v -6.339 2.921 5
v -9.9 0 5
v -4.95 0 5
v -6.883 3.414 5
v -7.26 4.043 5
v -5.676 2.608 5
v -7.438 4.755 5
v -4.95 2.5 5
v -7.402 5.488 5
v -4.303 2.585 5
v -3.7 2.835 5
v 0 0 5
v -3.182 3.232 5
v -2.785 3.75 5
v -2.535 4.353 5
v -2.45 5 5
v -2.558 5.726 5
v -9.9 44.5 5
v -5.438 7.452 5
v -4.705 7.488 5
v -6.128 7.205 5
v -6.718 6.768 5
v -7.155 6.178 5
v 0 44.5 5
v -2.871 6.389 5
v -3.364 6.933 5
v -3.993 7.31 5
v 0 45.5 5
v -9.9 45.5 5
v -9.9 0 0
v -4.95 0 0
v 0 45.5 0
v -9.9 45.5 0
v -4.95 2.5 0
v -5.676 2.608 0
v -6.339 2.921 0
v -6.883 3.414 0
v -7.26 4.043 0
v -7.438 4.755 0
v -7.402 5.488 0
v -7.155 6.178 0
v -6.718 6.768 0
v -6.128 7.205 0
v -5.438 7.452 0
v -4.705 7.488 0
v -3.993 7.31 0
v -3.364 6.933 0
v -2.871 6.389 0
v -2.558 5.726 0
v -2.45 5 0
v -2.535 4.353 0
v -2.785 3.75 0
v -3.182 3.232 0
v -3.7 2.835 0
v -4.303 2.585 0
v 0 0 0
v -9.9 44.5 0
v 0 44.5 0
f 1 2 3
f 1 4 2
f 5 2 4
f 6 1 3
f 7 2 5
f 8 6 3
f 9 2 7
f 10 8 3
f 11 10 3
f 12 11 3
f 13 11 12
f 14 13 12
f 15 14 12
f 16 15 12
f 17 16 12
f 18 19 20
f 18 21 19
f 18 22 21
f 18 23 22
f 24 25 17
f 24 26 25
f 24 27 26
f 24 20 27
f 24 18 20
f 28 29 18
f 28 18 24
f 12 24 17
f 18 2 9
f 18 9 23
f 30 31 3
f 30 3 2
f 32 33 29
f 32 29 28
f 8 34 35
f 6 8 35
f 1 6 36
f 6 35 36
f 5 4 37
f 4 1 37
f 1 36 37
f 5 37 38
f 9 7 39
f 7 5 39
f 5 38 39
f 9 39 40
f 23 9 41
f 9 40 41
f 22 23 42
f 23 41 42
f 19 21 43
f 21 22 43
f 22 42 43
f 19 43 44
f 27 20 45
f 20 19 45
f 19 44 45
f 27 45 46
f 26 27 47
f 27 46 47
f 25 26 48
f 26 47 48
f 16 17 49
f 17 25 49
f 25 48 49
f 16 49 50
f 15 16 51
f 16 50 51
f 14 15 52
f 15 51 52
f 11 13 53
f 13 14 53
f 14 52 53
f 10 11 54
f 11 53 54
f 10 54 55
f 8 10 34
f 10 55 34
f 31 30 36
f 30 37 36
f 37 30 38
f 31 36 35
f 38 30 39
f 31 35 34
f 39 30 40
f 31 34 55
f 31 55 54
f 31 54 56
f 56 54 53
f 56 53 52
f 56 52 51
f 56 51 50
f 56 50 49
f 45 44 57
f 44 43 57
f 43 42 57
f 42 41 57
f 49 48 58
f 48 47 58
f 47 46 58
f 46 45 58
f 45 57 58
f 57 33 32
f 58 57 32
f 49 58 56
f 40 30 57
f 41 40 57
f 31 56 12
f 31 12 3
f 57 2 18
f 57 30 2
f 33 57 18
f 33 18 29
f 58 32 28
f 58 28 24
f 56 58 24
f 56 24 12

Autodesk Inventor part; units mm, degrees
ref_plane "YZ Plane" through (0, 0, 0) normal (1, 0, 0) x (0, 1, 0)
ref_plane "XZ Plane" through (0, 0, 0) normal (0, 1, 0) x (-1, 0, 0)
ref_plane "XY Plane" through (0, 0, 0) normal (0, 0, 1) x (1, 0, 0)
sketch "Sketch2" plane through (0, 0, 0) normal (0, 0, 1) x (1, 0, 0)
  line L0 (0, 0) -> (-9.9, 0)
  line L1 (-9.9, 0) -> (-9.9, 105)
  line L2 (-9.9, 105) -> (0, 105)
  line L3 (0, 105) -> (0, 0)
  line L4 (-4.95, 0) -> (-4.95, 2.5)
  line L5 (-4.95, 0) -> (-2.45, 0) construction
  circle A0 centre (-4.95, 5) radius 2.5
  line L6 (-4.95, 7.5) -> (32.05, 7.5) construction
  line L7 (0, 44.5) -> (0, 0)
  line L8 (0, 0) -> (-9.9, 0)
  line L9 (-9.9, 0) -> (-9.9, 44.5)
  line L10 (-9.9, 45.5) -> (0, 45.5)
  line L11 (0, 45.5) -> (0, 0)
  line L12 (0, 0) -> (-9.9, 0)
  line L13 (-9.9, 0) -> (-9.9, 45.5)
  dimension "d35" = 5
  dimension "d4" = 9.9
  dimension "d5" = 105
  dimension "d33" = 2.5
  dimension "d34" = 90
extrude "Extrusion5" add sketch "Sketch2" along normal blind 5 contours L0 L1 L10 L3
properties part number "Cube_Holder_EB_V2_(38mm)"
